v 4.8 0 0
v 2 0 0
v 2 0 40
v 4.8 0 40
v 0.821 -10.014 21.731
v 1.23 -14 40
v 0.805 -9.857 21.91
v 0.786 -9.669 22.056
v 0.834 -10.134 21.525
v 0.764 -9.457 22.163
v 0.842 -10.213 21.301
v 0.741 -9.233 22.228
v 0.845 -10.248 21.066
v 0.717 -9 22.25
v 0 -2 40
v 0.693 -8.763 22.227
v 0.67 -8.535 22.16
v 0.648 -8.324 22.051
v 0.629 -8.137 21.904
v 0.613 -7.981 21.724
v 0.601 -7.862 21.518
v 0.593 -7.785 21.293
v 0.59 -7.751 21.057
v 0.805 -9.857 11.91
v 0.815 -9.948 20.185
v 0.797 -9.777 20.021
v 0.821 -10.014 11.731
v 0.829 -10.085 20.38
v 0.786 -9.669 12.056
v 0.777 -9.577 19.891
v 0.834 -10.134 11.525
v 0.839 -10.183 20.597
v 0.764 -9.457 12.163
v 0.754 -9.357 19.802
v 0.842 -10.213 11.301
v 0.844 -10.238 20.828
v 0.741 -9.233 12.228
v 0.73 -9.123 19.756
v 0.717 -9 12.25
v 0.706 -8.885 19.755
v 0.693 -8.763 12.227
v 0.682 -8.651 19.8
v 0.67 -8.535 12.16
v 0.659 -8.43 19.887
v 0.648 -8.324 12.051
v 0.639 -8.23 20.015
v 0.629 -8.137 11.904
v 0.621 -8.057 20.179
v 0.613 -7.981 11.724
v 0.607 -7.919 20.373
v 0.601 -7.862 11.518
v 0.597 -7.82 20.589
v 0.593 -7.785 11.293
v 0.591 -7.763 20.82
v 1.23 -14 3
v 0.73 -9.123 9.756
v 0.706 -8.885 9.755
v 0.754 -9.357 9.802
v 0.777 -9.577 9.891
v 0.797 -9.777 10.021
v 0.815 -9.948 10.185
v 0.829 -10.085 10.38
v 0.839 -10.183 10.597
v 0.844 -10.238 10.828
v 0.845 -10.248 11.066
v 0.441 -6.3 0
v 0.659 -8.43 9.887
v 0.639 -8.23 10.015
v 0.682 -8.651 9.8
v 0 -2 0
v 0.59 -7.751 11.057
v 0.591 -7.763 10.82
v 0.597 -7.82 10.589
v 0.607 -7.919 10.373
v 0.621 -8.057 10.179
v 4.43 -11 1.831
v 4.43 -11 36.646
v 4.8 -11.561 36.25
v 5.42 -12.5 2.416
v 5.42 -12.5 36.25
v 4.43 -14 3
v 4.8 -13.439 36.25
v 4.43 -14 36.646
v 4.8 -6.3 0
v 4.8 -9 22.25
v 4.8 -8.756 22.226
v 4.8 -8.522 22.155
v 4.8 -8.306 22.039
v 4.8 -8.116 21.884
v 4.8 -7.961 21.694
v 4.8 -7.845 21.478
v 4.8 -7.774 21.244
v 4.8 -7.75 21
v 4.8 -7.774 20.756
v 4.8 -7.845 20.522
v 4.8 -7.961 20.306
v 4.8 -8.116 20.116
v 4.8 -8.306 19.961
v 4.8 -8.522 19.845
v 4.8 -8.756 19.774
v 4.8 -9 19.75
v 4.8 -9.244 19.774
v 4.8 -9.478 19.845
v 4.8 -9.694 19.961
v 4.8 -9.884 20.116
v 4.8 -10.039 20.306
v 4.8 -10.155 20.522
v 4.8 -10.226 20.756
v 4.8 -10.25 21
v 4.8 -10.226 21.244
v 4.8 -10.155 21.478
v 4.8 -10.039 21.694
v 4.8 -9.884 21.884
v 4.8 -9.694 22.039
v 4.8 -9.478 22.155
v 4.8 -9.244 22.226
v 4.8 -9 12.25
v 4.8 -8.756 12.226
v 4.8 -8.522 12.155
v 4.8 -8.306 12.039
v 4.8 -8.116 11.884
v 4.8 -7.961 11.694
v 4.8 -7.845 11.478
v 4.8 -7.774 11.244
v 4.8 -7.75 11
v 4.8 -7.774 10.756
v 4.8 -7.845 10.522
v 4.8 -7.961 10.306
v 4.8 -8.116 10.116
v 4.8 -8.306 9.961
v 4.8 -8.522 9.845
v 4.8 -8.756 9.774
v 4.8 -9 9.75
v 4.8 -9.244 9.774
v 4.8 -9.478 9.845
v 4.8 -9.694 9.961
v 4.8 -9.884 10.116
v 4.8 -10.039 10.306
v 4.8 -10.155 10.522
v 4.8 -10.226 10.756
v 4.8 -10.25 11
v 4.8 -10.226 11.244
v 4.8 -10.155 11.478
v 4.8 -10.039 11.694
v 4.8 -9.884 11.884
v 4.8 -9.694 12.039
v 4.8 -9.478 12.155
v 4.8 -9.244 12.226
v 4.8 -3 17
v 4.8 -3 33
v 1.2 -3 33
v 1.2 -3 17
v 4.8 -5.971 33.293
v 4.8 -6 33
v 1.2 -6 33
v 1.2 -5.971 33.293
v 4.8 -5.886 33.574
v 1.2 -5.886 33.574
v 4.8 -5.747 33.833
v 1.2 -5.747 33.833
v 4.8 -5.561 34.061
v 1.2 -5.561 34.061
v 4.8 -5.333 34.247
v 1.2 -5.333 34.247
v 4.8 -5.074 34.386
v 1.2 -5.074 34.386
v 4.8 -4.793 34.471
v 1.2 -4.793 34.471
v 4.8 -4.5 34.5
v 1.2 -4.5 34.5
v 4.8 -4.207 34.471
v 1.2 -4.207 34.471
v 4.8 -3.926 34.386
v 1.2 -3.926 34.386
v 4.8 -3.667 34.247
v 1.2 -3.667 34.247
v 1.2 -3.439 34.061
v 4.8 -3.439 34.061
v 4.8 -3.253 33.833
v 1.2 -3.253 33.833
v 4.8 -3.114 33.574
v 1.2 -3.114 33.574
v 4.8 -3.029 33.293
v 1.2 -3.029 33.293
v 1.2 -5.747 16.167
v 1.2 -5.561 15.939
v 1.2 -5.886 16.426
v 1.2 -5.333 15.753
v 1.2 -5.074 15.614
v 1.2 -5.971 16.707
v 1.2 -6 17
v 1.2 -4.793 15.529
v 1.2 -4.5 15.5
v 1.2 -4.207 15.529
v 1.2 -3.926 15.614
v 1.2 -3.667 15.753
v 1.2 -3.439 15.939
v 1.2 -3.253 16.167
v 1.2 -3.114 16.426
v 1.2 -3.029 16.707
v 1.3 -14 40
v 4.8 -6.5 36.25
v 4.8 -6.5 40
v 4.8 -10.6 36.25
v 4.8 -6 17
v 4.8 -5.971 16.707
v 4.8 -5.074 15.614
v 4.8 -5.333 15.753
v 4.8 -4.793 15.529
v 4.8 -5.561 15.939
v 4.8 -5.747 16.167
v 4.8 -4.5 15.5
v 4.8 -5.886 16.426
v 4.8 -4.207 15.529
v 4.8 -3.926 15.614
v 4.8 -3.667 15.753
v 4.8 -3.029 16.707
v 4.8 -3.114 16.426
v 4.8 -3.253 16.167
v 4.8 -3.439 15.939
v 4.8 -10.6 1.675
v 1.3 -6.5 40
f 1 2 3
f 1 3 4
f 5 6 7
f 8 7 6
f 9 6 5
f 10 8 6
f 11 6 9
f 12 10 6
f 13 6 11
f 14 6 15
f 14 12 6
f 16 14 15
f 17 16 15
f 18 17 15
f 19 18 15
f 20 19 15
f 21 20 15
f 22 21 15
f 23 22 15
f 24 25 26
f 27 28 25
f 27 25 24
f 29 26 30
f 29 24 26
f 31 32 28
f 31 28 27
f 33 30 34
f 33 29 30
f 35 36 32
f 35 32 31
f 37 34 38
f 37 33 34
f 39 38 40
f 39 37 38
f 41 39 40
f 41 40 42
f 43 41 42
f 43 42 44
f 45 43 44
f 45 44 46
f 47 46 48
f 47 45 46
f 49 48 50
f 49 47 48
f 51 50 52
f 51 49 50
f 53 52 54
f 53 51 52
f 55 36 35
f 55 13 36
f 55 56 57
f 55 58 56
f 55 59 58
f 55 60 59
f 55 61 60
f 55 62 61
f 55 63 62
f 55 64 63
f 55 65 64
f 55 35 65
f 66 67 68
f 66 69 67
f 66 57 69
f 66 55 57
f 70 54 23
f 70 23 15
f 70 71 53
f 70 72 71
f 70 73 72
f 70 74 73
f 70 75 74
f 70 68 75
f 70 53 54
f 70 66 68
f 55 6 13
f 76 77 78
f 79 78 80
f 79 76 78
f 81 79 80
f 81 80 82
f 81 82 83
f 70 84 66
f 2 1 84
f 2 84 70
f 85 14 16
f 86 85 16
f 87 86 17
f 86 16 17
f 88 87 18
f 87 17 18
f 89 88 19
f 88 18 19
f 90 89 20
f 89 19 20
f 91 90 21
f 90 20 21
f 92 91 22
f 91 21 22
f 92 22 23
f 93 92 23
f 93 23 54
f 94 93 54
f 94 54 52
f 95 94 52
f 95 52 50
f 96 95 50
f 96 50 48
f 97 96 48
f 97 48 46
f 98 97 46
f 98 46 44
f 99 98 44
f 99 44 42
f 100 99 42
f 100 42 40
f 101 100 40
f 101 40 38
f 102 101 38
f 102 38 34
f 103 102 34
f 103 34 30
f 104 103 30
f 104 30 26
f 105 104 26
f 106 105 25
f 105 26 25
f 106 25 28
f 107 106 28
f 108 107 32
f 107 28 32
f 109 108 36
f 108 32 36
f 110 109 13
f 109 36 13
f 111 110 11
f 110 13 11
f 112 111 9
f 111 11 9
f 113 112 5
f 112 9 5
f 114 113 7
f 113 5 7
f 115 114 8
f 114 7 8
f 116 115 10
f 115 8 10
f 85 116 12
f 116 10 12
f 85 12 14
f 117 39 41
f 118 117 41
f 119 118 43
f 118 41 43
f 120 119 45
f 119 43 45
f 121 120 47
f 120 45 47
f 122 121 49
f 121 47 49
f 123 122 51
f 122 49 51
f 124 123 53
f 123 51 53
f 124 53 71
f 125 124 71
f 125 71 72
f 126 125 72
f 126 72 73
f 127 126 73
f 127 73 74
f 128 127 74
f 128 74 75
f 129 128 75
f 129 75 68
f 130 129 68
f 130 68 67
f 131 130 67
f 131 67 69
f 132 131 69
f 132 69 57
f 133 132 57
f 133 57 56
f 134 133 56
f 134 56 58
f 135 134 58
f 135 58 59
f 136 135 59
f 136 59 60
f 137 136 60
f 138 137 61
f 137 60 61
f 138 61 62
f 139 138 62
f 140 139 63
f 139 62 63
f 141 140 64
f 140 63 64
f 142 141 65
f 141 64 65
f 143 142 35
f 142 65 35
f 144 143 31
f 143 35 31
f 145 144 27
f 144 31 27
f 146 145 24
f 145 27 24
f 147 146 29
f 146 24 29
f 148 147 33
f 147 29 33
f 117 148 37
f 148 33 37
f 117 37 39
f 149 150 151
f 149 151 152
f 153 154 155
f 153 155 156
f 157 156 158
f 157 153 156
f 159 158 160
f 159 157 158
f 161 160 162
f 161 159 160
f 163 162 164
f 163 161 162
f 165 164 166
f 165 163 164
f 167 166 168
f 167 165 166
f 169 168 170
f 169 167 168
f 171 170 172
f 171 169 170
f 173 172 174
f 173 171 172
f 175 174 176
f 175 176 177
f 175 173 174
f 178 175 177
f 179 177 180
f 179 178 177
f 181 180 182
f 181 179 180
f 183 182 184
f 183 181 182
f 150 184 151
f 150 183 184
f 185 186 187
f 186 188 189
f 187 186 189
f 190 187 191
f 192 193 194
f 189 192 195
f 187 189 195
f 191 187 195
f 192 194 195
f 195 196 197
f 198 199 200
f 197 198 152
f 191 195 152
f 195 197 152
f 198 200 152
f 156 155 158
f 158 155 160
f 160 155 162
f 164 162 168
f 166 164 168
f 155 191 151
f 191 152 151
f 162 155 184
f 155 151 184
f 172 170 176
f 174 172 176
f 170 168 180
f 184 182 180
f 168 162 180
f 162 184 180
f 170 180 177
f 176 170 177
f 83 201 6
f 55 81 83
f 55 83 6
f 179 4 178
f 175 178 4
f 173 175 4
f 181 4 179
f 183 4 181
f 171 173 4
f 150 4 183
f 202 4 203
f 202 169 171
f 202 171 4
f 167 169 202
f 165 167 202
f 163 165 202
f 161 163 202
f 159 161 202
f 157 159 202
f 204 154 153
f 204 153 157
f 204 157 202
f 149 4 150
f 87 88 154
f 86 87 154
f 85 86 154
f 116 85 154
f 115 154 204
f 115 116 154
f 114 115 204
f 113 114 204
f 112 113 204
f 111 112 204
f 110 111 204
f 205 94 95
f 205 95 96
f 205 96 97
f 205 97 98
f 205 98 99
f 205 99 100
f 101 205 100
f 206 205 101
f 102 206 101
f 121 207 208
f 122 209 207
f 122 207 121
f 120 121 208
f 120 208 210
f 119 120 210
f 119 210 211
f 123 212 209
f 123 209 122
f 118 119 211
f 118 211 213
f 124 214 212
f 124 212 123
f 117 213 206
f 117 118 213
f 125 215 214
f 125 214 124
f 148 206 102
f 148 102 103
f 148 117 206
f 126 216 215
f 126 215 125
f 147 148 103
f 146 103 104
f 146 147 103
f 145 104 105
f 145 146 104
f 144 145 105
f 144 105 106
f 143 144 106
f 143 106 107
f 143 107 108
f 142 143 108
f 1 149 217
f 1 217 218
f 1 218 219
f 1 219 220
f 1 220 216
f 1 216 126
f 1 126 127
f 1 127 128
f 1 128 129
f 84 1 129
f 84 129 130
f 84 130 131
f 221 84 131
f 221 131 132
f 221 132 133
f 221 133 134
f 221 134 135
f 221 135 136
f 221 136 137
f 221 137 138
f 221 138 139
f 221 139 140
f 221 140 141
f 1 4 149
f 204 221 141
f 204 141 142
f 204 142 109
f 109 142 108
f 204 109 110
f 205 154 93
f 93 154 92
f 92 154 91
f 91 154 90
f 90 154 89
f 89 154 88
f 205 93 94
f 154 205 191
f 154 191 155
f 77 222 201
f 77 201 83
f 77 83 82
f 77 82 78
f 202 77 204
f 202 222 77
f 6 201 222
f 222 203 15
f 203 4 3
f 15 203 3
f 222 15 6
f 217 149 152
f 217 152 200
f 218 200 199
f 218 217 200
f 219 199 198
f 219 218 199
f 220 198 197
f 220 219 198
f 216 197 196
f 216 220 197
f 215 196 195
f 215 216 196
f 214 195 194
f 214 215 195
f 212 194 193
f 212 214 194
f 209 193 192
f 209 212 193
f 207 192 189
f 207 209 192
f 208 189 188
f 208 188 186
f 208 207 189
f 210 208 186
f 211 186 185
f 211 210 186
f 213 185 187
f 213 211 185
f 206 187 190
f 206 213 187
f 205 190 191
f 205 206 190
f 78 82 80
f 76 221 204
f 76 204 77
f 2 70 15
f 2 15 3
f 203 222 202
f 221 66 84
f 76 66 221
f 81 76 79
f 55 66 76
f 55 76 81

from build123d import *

# Parameters (mm, degrees)
BOSS_EXTRU_1_DEPTH           = 40
ENL_V_MAT_EXTRU_1_DEPTH      = 43.650205158
ENL_V_MAT_EXTRU_1_DEPTH_BACK = 43.650205158
ENL_V_MAT_EXTRU_3_DEPTH      = 40
TROU_TARAUD_M31_D            = 2.5
TROU_TARAUD_M31_DEPTH        = 8.5
TROU_TARAUD_M31_TIP          = 0.751075774
ENL_V_MAT_EXTRU_4_DEPTH      = 3.6


with BuildPart() as part:
    # Esquisse1 → Boss.-Extru.1 (new body)
    with BuildSketch(Plane.XY):
        Polygon((0, -2), (2, 0), (4.8, 0), (4.8, -10.6), (4.43, -11), (5.42, -12.5), (4.43, -14), (1.23, -14), align=None)
    extrude(amount=BOSS_EXTRU_1_DEPTH)

    # Esquisse2 → Enlèv. mat.-Extru.1 (cut, two sides: drawn at the far end of the back side and taken through both)
    with BuildSketch(Plane(origin=(4.8, 0, 0), x_dir=(0, 0, -1), z_dir=(1, 0, 0)).offset(-ENL_V_MAT_EXTRU_1_DEPTH_BACK)):
        Polygon((0, -14), (0, -6.3), (-3, -14), align=None)
    extrude(amount=ENL_V_MAT_EXTRU_1_DEPTH + ENL_V_MAT_EXTRU_1_DEPTH_BACK, mode=Mode.SUBTRACT)

    # Esquisse3 → Enlèv. mat.-Extru.3 (cut)
    with BuildSketch(Plane(origin=(0, -6.5, 0), x_dir=(-1, 0, 0), z_dir=(0, 1, 0))):
        Polygon((-6.8, 40), (-1.3, 40), (-4.8, 36.25), (-6.8, 36.25), align=None)
    extrude(amount=-ENL_V_MAT_EXTRU_3_DEPTH, mode=Mode.SUBTRACT)

    # Trou taraudé M31
    with Locations(Plane(origin=(4.8, 0, 0), x_dir=(0, 0, -1), z_dir=(1, 0, 0))):
        with Locations((-11, -9), (-21, -9)):
            Hole(TROU_TARAUD_M31_D / 2, depth=TROU_TARAUD_M31_DEPTH)
            with Locations((0, 0, -(TROU_TARAUD_M31_DEPTH + TROU_TARAUD_M31_TIP / 2))):  # 118° drill point
                Cone(0, TROU_TARAUD_M31_D / 2, TROU_TARAUD_M31_TIP, mode=Mode.SUBTRACT)

    # Esquisse6 → Enlèv. mat.-Extru.4 (cut)
    with BuildSketch(Plane(origin=(4.8, 0, 0), x_dir=(0, 0, -1), z_dir=(1, 0, 0))):
        with BuildLine():
            Line((-33, -3), (-17, -3))
            ThreePointArc((-17, -3), (-15.5, -4.5), (-17, -6))
            Line((-17, -6), (-33, -6))
            ThreePointArc((-33, -6), (-34.5, -4.5), (-33, -3))
        make_face()
    extrude(amount=-ENL_V_MAT_EXTRU_4_DEPTH, mode=Mode.SUBTRACT)


solid = part.part
